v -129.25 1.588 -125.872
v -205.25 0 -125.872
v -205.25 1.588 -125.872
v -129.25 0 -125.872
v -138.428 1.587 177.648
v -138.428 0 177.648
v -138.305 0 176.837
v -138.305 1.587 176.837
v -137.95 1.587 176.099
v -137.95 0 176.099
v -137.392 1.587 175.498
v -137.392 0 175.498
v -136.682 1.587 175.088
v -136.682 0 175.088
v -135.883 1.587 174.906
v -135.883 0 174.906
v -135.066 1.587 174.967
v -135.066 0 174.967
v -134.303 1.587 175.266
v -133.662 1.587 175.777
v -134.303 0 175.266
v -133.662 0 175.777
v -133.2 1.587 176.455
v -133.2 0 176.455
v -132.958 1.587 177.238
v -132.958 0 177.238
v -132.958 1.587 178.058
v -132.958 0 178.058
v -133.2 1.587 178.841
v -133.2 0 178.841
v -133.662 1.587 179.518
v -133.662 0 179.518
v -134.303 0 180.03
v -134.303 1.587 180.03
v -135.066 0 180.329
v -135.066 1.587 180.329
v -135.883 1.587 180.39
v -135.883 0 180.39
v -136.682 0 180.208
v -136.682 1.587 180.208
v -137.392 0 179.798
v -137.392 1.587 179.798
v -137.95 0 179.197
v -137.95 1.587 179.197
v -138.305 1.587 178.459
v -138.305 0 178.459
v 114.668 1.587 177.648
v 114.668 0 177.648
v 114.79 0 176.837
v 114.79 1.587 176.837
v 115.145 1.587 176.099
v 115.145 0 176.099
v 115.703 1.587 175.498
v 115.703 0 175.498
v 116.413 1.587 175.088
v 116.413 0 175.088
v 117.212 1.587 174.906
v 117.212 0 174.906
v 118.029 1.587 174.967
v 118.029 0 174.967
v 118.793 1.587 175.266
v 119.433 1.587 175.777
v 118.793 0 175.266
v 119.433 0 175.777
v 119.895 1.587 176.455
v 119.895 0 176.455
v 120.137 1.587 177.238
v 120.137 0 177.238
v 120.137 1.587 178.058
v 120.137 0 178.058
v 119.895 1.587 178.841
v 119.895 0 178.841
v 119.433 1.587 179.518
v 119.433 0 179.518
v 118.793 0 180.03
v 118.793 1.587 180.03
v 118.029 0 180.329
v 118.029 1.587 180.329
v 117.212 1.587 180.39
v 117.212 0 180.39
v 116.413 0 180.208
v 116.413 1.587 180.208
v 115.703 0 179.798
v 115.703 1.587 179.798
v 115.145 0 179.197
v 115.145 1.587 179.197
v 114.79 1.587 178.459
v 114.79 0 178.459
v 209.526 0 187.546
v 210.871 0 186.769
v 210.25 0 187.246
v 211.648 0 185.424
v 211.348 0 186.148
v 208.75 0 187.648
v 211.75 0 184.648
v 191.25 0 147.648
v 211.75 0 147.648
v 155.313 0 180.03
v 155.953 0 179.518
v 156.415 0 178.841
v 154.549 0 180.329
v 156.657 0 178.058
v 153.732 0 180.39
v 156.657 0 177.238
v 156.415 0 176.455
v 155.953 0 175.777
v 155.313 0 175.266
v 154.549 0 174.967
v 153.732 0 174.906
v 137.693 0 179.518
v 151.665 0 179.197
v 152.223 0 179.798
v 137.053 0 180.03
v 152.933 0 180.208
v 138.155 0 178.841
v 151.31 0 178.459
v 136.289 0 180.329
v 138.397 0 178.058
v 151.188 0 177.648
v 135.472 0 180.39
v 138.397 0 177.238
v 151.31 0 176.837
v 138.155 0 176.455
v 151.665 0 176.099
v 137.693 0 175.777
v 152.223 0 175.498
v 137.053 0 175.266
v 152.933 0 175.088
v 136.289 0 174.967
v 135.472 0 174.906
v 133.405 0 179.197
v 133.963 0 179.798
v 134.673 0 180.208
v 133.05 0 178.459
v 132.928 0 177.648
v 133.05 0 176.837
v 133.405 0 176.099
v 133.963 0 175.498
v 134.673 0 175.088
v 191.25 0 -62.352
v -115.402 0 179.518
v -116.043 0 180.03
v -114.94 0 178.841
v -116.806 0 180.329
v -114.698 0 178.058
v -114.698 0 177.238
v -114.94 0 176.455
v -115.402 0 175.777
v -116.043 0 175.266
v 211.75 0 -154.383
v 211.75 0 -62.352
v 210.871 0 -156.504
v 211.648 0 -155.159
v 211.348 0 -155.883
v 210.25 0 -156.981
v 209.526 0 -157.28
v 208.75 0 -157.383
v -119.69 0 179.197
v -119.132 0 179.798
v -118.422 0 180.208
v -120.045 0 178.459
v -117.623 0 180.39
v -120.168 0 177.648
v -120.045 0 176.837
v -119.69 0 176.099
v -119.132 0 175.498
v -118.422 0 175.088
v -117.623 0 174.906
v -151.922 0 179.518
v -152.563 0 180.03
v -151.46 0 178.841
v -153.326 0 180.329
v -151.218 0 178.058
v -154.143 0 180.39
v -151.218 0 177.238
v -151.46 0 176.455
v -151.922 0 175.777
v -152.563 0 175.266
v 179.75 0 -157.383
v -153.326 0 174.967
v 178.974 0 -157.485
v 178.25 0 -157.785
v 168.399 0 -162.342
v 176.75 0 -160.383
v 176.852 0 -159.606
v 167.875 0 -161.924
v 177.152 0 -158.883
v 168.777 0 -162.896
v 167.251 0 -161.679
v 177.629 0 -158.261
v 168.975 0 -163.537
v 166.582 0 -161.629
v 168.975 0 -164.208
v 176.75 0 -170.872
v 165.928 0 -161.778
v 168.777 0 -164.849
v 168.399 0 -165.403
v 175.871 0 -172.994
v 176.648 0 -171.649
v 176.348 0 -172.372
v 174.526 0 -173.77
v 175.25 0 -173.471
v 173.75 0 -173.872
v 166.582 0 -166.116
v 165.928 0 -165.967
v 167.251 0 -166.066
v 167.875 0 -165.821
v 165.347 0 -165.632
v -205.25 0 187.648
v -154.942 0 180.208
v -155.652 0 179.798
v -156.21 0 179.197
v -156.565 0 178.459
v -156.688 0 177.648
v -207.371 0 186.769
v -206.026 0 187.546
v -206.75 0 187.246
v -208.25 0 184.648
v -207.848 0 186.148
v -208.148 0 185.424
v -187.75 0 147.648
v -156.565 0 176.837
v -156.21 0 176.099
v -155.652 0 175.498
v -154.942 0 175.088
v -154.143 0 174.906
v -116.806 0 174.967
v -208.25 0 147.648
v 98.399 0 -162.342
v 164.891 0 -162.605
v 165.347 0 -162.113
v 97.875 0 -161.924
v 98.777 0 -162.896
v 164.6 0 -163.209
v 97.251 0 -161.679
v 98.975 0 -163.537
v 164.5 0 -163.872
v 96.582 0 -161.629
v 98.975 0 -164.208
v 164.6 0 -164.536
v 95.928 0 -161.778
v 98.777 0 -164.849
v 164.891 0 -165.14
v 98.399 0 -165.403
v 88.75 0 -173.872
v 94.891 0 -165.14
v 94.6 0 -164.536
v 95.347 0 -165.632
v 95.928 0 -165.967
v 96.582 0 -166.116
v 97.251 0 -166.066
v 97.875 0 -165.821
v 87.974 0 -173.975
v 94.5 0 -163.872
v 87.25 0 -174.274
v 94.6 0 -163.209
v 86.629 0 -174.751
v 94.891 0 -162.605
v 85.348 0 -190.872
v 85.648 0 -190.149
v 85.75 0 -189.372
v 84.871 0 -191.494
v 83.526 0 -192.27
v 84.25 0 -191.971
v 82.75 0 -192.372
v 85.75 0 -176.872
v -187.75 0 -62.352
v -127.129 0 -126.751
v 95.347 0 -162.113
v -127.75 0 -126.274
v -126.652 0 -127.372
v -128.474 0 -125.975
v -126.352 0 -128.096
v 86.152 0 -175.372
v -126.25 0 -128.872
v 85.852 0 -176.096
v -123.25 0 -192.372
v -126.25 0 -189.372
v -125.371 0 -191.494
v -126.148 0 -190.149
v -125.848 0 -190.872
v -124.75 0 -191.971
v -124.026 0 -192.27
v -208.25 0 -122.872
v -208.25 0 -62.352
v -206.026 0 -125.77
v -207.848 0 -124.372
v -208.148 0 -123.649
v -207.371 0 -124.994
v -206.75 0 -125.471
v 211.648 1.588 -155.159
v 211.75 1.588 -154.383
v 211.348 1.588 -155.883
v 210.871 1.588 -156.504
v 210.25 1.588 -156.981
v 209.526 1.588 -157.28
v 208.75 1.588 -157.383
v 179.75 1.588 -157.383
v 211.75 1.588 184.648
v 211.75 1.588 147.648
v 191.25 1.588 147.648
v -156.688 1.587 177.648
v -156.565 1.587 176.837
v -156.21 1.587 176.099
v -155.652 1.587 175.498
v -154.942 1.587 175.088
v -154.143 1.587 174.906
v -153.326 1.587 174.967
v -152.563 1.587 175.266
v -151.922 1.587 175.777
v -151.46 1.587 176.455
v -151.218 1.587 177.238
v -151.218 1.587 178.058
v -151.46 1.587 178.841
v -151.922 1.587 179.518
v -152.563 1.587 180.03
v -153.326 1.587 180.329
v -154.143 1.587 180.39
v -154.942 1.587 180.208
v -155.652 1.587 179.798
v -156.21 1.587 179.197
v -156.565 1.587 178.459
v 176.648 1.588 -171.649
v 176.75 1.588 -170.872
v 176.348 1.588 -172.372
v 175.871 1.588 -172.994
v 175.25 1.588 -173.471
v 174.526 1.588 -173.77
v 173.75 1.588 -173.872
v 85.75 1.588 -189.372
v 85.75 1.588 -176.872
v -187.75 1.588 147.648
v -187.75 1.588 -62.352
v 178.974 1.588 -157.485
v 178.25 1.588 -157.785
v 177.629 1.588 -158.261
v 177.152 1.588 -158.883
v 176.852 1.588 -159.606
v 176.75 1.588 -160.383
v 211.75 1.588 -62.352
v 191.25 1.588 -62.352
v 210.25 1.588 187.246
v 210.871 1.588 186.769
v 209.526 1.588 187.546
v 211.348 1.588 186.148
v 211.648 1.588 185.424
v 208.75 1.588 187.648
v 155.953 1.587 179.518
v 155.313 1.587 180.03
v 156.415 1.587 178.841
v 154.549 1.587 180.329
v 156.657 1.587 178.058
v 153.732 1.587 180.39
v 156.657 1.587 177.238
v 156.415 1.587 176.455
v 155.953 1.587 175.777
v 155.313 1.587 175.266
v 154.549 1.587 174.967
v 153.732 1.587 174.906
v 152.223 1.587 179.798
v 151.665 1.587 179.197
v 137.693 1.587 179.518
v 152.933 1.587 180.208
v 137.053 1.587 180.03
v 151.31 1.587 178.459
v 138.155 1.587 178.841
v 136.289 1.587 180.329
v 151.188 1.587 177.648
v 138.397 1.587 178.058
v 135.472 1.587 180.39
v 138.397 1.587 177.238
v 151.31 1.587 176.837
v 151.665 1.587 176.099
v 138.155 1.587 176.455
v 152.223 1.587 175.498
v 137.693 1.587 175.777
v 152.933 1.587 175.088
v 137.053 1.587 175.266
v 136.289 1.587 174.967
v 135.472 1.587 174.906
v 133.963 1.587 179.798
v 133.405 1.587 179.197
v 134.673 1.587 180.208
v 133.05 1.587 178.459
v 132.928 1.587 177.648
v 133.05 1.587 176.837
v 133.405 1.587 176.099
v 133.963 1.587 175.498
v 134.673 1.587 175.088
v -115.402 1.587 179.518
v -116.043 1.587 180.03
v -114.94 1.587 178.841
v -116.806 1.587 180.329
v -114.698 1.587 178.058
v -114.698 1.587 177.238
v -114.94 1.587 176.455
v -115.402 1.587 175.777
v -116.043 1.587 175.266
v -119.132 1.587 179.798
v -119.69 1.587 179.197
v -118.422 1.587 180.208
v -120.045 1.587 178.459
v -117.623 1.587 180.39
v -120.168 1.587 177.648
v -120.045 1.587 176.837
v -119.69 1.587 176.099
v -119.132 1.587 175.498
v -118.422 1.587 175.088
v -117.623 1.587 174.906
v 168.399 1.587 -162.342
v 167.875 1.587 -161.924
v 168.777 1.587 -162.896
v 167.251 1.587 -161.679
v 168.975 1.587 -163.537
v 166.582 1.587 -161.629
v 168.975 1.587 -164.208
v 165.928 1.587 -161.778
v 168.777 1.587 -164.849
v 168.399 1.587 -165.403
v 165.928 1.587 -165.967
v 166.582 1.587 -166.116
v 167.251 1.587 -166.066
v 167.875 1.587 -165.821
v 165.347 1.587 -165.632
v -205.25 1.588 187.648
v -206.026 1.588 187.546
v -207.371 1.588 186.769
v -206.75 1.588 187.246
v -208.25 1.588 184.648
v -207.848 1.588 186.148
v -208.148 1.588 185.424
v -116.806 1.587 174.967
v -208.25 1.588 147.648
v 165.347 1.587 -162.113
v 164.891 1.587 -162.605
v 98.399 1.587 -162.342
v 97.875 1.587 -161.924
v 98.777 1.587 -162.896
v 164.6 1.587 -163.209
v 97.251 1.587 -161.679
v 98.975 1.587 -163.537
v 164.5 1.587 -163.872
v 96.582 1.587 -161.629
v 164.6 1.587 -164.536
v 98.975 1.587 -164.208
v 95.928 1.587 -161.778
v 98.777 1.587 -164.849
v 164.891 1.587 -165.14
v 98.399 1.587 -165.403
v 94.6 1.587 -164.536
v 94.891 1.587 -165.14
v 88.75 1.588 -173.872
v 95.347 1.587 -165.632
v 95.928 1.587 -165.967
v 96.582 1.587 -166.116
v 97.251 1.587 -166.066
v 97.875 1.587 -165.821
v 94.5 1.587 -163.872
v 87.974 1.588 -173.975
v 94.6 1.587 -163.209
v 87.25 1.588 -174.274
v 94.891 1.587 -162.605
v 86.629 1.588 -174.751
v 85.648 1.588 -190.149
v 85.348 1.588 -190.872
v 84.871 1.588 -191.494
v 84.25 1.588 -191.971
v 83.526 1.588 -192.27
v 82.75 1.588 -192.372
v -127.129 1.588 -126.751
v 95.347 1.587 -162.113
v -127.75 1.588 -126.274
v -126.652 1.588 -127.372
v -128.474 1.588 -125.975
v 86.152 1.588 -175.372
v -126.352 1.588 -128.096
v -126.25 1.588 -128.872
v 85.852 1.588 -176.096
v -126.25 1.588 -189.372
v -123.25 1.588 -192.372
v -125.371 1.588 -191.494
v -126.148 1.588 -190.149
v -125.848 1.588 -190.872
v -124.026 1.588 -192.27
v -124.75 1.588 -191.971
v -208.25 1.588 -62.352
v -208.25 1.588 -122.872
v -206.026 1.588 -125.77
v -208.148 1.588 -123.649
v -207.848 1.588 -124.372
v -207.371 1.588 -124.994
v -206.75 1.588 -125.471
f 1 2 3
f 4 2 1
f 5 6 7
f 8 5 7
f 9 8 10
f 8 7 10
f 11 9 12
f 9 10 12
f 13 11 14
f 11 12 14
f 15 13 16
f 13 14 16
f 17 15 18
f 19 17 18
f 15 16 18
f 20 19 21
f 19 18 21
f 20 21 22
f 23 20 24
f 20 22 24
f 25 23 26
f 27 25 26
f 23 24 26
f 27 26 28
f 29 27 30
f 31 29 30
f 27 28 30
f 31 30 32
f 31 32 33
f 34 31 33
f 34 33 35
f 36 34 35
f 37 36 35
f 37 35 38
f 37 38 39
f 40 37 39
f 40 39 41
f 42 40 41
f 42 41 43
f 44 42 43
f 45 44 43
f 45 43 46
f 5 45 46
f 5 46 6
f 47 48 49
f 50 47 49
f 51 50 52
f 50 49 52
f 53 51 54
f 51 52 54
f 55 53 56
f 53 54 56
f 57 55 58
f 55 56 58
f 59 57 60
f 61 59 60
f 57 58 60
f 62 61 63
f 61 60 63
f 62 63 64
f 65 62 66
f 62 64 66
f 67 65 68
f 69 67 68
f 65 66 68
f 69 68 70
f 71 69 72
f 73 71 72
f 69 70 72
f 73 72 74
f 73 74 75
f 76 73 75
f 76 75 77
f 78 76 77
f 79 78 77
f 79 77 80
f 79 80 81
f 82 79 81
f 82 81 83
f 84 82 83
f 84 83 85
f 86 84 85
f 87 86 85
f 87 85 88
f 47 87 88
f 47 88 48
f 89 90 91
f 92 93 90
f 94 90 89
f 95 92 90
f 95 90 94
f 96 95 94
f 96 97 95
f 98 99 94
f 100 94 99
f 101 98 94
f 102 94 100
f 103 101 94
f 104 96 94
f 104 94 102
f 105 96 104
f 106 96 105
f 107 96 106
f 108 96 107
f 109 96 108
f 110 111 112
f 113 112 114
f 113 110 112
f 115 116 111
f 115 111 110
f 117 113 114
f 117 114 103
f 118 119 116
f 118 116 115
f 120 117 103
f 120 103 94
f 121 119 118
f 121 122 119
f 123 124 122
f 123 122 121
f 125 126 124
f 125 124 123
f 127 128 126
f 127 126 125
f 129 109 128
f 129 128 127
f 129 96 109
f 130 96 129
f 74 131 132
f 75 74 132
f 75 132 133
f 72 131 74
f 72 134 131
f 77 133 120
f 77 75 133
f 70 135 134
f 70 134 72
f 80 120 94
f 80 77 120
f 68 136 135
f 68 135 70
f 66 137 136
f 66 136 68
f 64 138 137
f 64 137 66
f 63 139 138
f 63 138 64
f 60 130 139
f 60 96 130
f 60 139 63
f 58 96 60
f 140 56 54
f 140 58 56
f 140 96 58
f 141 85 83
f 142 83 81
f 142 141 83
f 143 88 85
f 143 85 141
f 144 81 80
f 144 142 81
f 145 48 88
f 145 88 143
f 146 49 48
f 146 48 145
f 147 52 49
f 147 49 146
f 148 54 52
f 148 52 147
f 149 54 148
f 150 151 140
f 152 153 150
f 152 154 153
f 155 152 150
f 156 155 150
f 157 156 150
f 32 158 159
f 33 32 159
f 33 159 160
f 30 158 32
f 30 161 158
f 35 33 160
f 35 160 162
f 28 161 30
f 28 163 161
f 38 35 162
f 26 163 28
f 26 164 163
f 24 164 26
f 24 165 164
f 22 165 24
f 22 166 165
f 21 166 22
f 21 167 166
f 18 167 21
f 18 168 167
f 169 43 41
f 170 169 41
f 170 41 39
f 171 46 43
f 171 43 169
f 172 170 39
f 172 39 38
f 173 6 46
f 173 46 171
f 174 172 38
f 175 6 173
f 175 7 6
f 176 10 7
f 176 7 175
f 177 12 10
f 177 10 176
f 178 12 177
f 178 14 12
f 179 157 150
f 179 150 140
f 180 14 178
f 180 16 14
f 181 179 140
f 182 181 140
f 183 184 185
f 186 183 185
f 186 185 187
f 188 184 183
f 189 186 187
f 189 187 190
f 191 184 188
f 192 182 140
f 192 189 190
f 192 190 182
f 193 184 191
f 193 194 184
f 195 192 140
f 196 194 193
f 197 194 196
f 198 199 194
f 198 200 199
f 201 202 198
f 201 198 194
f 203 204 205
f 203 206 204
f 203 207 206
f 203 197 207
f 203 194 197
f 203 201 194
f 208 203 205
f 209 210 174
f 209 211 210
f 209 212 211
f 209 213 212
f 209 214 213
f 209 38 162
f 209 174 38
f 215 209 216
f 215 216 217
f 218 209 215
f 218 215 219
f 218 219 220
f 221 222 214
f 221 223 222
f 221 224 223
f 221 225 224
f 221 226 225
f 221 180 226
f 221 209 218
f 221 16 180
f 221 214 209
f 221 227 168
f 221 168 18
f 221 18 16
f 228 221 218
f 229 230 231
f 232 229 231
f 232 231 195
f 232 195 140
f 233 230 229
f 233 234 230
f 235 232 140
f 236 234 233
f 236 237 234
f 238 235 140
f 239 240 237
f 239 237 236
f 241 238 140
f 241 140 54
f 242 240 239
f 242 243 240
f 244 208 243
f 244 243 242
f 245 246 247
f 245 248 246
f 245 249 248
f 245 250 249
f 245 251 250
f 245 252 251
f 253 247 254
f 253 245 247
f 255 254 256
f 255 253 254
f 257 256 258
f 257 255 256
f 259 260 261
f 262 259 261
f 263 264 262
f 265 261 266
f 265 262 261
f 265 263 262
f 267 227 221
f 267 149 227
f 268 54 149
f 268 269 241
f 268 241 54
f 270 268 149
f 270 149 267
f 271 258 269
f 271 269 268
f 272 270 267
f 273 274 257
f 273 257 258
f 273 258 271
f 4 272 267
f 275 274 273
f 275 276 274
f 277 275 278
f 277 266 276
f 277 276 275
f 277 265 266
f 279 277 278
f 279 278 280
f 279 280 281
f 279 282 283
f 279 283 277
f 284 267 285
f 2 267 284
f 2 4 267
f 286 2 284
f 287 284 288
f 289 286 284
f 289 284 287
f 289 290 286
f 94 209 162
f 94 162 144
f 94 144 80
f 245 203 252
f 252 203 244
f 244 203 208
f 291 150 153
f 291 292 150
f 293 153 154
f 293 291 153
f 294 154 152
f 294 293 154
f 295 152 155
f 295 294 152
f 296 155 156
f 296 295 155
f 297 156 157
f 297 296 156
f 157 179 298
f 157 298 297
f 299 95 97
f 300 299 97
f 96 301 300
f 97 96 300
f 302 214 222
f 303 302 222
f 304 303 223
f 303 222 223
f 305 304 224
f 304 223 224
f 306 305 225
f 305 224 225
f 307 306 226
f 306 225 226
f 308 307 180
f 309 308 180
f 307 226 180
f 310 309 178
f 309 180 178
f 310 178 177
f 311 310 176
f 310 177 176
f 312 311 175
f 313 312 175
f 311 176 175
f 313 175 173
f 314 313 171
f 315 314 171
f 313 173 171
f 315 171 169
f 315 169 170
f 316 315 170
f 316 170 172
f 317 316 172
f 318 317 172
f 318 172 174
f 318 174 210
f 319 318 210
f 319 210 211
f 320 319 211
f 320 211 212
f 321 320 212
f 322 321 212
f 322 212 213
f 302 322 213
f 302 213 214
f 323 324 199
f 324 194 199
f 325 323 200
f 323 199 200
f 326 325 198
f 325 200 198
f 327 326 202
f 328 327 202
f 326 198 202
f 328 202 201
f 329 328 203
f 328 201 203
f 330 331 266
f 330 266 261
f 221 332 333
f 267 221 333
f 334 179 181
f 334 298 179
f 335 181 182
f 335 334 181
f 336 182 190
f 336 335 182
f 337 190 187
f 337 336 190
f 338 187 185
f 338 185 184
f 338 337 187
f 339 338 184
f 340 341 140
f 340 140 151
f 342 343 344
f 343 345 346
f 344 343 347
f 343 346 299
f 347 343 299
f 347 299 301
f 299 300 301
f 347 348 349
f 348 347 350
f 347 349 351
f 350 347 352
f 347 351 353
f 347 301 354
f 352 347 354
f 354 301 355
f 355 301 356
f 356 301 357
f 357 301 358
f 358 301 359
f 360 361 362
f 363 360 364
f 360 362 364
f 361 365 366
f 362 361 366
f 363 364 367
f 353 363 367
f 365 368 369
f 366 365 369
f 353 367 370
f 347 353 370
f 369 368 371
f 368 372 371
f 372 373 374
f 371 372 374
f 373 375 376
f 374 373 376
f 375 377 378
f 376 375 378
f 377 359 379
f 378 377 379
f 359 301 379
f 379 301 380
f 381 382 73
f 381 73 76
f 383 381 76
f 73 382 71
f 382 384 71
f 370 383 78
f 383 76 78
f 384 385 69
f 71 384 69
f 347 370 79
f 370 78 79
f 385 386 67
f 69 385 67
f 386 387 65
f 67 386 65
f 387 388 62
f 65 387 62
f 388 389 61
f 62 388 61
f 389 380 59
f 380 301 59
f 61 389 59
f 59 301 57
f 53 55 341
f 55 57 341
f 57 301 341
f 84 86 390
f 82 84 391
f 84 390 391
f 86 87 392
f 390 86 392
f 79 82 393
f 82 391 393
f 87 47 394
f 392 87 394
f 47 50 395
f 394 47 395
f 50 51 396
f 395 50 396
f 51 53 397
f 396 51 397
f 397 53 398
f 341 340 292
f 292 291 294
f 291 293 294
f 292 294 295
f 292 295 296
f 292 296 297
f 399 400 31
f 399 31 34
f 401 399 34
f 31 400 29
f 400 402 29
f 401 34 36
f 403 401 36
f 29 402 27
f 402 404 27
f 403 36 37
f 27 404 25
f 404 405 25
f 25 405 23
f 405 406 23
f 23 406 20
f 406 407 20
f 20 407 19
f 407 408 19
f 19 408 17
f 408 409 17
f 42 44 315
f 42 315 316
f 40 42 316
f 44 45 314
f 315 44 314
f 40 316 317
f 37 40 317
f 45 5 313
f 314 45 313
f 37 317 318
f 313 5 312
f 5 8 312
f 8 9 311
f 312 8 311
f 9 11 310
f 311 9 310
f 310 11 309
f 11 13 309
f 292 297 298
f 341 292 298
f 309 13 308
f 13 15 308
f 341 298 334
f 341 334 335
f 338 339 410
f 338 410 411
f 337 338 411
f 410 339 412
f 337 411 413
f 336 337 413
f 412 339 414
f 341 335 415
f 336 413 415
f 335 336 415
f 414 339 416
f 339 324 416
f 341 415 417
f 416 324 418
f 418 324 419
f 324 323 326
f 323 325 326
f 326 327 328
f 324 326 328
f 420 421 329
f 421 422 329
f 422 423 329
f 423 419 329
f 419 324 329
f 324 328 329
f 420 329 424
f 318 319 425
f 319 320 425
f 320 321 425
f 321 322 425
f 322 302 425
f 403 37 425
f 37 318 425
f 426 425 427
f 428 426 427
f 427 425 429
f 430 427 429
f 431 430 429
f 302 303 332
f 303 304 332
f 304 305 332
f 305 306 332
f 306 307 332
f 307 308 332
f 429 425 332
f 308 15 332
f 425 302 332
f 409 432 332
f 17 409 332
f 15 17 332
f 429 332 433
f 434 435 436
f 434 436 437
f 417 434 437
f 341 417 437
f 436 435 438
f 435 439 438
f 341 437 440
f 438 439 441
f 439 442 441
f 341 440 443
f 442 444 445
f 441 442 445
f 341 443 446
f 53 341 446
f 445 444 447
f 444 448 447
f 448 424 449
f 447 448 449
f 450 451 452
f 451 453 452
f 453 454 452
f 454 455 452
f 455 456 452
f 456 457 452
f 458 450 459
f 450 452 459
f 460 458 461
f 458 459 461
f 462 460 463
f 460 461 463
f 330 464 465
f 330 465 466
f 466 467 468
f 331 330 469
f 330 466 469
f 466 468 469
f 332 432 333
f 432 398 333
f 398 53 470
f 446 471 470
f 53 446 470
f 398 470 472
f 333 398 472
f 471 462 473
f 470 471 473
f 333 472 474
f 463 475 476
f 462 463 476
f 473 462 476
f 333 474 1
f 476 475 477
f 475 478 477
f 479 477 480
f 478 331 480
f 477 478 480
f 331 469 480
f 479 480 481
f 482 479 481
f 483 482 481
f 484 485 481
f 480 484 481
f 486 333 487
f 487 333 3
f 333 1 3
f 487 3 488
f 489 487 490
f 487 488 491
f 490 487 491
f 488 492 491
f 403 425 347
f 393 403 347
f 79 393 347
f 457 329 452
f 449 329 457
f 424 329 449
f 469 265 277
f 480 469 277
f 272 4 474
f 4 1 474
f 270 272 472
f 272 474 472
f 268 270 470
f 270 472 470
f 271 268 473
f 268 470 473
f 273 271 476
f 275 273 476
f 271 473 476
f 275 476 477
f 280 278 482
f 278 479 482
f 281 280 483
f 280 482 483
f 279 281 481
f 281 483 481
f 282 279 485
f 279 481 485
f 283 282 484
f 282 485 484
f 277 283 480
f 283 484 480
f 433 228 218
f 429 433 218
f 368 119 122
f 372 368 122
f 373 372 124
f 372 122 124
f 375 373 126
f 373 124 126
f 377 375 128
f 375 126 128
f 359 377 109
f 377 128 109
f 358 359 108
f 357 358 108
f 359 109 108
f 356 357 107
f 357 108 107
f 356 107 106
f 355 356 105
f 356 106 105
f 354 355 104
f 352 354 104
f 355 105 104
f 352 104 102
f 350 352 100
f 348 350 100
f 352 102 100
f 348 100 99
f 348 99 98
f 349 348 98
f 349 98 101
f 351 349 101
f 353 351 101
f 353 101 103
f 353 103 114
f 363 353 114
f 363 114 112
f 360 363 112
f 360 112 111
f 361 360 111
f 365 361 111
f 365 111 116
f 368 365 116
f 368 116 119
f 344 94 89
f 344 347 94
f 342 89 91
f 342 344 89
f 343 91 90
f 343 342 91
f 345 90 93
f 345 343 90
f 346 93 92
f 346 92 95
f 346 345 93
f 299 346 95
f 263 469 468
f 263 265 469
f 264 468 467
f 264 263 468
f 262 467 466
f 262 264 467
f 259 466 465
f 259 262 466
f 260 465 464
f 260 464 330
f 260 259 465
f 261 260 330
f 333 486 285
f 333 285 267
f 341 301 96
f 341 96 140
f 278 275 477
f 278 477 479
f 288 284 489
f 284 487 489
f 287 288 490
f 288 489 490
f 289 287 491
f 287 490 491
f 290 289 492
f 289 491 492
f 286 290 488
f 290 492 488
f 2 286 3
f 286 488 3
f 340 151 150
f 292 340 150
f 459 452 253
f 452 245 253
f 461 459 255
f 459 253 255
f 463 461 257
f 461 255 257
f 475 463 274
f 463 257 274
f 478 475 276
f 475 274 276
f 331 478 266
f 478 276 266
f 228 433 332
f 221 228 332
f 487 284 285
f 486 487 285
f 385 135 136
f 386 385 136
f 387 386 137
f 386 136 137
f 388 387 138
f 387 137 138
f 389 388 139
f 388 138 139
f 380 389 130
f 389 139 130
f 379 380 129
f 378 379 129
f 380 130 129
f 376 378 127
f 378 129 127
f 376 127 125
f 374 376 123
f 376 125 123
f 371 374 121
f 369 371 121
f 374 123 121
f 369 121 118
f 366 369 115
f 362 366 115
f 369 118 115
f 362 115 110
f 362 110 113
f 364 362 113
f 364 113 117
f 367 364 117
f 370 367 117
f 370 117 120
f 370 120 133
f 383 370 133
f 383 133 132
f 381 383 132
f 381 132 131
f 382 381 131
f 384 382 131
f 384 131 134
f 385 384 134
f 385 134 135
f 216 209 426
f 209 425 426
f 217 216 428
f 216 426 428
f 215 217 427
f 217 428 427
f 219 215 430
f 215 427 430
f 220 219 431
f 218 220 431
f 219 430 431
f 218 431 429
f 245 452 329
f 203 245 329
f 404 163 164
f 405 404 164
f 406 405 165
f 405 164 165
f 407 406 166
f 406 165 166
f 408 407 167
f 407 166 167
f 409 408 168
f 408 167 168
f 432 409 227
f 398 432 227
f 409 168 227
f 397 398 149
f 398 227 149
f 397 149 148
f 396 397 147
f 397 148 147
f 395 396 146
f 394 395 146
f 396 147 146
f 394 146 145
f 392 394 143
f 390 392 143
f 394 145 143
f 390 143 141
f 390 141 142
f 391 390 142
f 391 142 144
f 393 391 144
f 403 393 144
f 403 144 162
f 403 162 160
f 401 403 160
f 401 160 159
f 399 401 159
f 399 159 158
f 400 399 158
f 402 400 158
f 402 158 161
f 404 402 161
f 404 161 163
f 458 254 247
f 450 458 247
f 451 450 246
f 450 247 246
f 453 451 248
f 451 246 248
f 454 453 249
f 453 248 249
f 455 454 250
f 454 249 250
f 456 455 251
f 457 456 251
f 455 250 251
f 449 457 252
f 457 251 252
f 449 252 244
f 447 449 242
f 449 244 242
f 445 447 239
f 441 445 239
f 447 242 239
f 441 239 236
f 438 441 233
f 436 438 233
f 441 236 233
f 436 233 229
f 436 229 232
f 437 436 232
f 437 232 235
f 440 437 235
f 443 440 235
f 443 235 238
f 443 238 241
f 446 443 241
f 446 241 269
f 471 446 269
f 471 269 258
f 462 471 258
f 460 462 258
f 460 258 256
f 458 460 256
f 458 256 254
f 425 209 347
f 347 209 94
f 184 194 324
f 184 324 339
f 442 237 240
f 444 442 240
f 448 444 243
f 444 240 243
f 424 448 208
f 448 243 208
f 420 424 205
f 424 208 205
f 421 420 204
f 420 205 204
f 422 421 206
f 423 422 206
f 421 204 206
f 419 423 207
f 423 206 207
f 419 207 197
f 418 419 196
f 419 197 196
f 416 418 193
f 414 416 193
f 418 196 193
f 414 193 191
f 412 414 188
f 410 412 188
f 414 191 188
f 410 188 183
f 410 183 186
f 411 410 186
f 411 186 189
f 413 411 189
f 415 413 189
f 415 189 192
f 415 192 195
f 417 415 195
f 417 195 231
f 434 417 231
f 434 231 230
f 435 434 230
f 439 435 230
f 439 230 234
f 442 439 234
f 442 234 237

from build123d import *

# Parameters (mm, degrees)
BOSS_EXTRUDE1_DEPTH     = 1.5875
M5_CLEARANCE_HOLE1_D    = 5.5
SKETCH11_W              = 91
SKETCH11_H              = 18.5
CUT_EXTRUDE1_DEPTH      = 1
CUT_EXTRUDE1_DEPTH_BACK = 2.5875
M4_CLEARANCE_HOLE1_D    = 4.5
FILLET1_R               = 3
SKETCH15_W              = 20.5
SKETCH15_H              = 210
CUT_EXTRUDE2_DEPTH      = 1
CUT_EXTRUDE2_DEPTH_BACK = 2.5875


with BuildPart() as part:
    # Sketch1 → Boss-Extrude1 (new body)
    with BuildSketch(Plane(origin=(0, 0, 0), x_dir=(1, 0, 0), z_dir=(0, 1, 0))):
        Polygon((91.75, -187.647941311), (-208.25, -187.647941311), (-208.25, 92.973423913), (-208.25, 125.872458689), (-126.25, 125.872458689), (-126.25, 192.372458689), (-117.25, 192.372458689), (176.75, 192.372458689), (176.75, 157.382658689), (211.75, 157.382658689), (211.75, -157.627541311), (211.75, -187.647941311), align=None)
    extrude(amount=BOSS_EXTRUDE1_DEPTH)

    # M5 Clearance Hole1 (through all)
    with Locations(Plane(origin=(0, 1.5875, 0), x_dir=(1, 0, 0), z_dir=(0, 1, 0))):
        with Locations((-153.937540098, -177.647941311), (-135.677540098, -177.647941311), (-117.417540098, -177.647941311), (117.417540098, -177.647941311), (135.677540098, -177.647941311), (153.937540098, -177.647941311)):
            Hole(M5_CLEARANCE_HOLE1_D / 2)

    # Sketch11 → Cut-Extrude1 (cut, two sides)
    with BuildSketch(Plane(origin=(0, 1.5875, 0), x_dir=(1, 0, 0), z_dir=(0, 1, 0))) as cut_extrude1_sk:
        with Locations((131.25, 183.122458689)):
            Rectangle(SKETCH11_W, SKETCH11_H)
    extrude(amount=CUT_EXTRUDE1_DEPTH, mode=Mode.SUBTRACT)
    extrude(cut_extrude1_sk.sketch, amount=-CUT_EXTRUDE1_DEPTH_BACK, mode=Mode.SUBTRACT)

    # M4 Clearance Hole1 (through all)
    with Locations(Plane(origin=(0, 1.5875, 0), x_dir=(1, 0, 0), z_dir=(0, 1, 0))):
        with Locations((96.75, 163.872458689), (166.75, 163.872458689)):
            Hole(M4_CLEARANCE_HOLE1_D / 2)

    # Fillet1
    fillet1_edges = [part.edges().sort_by_distance(p)[0] for p in [
        (211.75, 0.79375, 187.647941311),
        (-208.25, 0.79375, 187.647941311),
        (-208.25, 0.79375, -125.872458689),
        (-126.25, 0.79375, -125.872458689),
        (-126.25, 0.79375, -192.372458689),
        (176.75, 0.79375, -157.382658689),
        (211.75, 0.79375, -157.382658689),
        (176.75, 0.79375, -173.872458689),
        (85.75, 0.79375, -173.872458689),
        (85.75, 0.79375, -192.372458689),
    ]]
    fillet(fillet1_edges, radius=FILLET1_R)

    # Sketch15 → Cut-Extrude2 (cut, two sides)
    with BuildSketch(Plane(origin=(0, 1.5875, 0), x_dir=(1, 0, 0), z_dir=(0, 1, 0))) as cut_extrude2_sk:
        with Locations((-198, -42.647941311)):
            Rectangle(SKETCH15_W, SKETCH15_H)
        with Locations((201.5, -42.647941311)):
            Rectangle(SKETCH15_W, SKETCH15_H)
    extrude(amount=CUT_EXTRUDE2_DEPTH, mode=Mode.SUBTRACT)
    extrude(cut_extrude2_sk.sketch, amount=-CUT_EXTRUDE2_DEPTH_BACK, mode=Mode.SUBTRACT)


solid = part.part
